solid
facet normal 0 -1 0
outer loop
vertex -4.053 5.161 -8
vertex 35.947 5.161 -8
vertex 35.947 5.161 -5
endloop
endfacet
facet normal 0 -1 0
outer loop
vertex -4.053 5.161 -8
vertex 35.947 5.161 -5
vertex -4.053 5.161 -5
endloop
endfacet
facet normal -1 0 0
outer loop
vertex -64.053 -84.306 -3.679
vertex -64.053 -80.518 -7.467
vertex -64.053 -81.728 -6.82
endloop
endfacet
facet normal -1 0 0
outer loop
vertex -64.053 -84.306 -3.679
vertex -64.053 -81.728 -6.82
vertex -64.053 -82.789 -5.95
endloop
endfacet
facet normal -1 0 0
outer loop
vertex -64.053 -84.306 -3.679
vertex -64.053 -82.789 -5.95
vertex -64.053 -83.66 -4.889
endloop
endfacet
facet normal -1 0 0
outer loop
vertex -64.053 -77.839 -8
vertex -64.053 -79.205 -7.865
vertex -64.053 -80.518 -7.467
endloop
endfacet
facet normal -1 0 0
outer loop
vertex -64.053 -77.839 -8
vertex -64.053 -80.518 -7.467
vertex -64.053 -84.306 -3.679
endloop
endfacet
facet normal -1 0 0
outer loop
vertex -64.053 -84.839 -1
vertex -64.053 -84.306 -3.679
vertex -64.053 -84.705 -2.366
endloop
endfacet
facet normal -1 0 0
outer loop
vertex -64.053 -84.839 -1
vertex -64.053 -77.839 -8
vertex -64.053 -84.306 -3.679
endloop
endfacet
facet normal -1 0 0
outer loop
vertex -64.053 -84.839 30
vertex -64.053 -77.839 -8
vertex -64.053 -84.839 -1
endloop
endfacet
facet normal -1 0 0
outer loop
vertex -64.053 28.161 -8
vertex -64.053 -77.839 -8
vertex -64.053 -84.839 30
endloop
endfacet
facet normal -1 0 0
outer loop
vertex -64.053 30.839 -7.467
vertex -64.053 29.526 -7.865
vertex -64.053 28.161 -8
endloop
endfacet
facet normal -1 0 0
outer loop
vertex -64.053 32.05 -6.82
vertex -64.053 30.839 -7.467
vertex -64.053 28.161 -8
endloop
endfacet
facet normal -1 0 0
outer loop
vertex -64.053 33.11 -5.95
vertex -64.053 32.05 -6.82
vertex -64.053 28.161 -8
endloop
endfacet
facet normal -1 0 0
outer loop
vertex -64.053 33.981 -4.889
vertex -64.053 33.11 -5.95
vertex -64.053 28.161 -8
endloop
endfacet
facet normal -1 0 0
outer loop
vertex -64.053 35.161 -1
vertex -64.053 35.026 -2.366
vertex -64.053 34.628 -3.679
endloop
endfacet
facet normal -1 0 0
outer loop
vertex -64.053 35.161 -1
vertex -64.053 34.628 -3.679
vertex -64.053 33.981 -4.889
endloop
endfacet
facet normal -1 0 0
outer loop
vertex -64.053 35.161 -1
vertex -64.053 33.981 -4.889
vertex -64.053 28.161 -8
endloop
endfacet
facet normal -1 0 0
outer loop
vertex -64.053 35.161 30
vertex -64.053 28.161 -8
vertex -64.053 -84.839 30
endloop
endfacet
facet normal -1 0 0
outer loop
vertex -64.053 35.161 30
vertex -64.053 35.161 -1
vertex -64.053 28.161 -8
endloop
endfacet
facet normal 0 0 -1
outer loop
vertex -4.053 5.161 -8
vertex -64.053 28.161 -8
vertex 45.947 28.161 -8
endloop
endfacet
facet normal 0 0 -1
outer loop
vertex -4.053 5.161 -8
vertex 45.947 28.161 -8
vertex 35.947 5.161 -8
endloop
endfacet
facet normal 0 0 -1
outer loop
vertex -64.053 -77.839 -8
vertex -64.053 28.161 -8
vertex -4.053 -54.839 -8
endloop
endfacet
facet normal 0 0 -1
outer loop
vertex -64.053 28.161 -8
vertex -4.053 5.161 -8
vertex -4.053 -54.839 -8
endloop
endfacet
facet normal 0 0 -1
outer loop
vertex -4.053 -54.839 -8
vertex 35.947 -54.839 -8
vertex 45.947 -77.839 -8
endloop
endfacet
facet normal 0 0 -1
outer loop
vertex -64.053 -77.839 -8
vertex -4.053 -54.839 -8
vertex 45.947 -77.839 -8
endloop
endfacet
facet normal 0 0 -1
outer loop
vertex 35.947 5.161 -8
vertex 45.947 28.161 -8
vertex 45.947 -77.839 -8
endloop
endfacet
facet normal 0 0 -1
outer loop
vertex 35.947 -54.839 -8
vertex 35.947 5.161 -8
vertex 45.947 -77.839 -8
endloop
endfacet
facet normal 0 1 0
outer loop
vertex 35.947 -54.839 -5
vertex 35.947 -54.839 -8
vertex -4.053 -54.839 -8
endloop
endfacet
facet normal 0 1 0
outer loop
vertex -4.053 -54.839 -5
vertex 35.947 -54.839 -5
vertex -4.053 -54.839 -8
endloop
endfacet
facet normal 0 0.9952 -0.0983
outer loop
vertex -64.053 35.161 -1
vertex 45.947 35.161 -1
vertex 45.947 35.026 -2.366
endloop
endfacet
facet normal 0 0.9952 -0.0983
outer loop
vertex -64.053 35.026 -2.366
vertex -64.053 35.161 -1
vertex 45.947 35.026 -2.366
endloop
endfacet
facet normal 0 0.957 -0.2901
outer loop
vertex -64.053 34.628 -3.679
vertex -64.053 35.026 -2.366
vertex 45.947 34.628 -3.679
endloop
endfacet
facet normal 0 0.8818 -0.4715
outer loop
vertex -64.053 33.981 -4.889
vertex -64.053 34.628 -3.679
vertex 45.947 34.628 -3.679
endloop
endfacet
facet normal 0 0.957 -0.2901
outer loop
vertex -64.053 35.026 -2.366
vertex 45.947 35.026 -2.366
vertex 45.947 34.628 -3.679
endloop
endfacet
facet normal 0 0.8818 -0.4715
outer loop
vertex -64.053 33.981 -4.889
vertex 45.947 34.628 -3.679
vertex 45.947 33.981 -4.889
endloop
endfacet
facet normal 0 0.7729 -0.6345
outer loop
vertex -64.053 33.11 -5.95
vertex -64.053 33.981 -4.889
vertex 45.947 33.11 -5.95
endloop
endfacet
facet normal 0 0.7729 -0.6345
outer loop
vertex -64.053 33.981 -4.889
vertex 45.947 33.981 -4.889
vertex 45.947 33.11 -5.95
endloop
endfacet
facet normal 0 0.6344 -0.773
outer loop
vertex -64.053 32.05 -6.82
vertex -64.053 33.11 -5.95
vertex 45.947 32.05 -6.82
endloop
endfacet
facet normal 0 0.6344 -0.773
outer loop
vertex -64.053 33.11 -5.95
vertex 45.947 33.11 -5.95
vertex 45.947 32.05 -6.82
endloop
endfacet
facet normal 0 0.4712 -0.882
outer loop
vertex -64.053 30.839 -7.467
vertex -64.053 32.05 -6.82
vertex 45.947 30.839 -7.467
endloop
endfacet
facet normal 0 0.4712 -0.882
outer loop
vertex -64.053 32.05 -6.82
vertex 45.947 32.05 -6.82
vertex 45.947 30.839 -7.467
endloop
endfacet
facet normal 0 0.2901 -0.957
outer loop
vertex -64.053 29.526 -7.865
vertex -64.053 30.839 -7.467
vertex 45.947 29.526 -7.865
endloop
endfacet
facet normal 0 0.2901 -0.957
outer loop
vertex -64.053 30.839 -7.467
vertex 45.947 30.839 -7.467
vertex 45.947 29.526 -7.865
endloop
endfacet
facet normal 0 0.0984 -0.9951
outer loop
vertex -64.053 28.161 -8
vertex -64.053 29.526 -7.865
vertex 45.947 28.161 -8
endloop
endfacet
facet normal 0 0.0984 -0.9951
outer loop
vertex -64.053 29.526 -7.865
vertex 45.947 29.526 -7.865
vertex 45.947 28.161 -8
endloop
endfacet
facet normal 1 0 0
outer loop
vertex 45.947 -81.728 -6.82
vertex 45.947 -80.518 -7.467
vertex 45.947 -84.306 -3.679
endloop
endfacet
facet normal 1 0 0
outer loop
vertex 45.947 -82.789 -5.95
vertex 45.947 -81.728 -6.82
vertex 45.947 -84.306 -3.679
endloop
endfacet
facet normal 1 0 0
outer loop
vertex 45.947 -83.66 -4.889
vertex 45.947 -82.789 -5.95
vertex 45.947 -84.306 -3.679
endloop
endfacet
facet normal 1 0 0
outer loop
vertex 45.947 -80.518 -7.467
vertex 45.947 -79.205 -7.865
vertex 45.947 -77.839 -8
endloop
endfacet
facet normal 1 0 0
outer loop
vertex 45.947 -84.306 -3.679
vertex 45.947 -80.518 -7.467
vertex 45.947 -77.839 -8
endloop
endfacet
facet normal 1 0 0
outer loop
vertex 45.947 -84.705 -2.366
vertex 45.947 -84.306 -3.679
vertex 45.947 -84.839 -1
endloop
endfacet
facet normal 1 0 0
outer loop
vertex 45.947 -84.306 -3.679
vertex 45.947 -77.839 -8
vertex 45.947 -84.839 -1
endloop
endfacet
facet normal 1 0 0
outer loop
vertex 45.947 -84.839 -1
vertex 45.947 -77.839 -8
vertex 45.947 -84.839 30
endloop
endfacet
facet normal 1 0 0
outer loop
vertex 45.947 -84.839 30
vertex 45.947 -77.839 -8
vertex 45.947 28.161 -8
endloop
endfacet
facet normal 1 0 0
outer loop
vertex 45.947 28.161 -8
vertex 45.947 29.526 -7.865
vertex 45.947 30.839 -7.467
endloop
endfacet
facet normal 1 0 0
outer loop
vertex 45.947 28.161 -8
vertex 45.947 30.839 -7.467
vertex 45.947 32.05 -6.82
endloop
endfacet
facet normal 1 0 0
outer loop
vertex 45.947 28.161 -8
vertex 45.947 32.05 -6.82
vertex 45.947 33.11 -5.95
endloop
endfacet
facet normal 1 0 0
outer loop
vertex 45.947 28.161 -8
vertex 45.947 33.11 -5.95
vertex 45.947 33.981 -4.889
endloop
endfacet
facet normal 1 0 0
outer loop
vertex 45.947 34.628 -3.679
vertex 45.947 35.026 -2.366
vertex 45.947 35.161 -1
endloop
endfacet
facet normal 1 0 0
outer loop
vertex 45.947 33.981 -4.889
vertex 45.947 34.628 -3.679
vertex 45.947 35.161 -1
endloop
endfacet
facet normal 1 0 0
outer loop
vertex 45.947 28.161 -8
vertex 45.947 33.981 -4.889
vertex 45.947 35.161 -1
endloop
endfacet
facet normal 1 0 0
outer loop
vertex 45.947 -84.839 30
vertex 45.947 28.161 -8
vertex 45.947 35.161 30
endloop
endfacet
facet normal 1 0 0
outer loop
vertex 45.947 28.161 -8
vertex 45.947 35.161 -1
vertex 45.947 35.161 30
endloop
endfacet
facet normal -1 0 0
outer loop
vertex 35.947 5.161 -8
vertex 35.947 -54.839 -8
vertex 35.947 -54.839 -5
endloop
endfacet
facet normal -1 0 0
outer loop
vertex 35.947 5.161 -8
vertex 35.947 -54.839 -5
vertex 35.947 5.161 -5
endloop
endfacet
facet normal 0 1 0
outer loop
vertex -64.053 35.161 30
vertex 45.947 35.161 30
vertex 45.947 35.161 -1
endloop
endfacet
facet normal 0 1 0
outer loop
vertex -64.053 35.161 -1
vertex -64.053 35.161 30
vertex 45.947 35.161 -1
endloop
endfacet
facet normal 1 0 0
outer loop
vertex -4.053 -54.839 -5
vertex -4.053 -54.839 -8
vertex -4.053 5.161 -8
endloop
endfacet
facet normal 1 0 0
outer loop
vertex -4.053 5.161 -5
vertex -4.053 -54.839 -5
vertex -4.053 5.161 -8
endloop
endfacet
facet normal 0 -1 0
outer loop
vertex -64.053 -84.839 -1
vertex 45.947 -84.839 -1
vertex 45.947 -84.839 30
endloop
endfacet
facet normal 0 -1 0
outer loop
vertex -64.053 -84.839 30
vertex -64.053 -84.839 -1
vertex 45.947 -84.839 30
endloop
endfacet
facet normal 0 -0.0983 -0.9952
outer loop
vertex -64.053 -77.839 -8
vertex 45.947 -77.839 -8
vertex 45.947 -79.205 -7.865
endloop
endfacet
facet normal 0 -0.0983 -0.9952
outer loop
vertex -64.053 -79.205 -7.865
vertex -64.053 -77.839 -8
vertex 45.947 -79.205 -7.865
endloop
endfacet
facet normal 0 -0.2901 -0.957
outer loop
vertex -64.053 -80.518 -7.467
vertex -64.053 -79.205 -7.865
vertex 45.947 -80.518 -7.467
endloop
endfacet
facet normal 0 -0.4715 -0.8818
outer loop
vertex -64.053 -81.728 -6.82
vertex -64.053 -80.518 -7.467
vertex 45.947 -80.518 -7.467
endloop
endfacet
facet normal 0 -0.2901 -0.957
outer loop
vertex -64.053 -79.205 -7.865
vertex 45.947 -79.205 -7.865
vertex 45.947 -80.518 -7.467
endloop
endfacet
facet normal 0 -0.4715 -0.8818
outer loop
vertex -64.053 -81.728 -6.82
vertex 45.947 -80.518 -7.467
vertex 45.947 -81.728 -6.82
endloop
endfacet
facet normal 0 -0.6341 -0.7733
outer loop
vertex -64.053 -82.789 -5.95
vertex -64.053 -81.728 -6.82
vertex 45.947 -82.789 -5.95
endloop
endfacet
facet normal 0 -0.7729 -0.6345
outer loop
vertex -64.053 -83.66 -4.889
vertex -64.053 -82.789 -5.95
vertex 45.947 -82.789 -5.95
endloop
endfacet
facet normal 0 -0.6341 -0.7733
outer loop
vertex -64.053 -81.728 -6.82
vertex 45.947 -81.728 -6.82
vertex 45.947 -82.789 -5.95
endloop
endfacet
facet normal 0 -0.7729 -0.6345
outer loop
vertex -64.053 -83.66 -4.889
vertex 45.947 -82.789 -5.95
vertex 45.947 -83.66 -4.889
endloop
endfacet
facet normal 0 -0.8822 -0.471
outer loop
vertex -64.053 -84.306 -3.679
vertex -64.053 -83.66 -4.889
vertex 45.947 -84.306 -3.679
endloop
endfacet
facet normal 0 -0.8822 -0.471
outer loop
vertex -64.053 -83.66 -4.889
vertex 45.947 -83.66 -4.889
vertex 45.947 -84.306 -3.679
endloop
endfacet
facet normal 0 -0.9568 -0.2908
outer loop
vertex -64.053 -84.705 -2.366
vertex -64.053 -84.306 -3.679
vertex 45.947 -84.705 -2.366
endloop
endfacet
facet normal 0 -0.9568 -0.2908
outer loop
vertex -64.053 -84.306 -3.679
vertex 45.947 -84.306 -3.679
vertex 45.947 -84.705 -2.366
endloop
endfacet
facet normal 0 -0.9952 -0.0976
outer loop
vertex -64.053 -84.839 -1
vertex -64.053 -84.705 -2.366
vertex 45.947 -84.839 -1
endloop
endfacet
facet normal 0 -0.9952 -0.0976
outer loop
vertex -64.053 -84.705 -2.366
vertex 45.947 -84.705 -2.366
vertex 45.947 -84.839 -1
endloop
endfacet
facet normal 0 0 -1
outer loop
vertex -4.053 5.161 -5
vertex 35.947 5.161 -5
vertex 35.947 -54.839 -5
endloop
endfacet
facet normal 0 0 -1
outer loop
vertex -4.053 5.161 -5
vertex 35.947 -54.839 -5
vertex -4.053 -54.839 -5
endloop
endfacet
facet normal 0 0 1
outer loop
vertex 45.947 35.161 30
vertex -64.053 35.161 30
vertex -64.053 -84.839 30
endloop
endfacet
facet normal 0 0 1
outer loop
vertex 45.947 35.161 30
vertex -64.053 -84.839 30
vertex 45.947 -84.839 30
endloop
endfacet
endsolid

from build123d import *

# Parameters (mm, degrees)
SKETCH_1_W          = 110
SKETCH_1_H          = 120
EXTRUDE_1_DEPTH     = 30
EXTRUDE_2_DEPTH     = 110
SKETCH_3_W          = 40
SKETCH_3_H          = 60
CUT_EXTRUDE_1_DEPTH = 3


with BuildPart() as part:
    # 스케치1 → 보스-돌출1 (new body)
    with BuildSketch(Plane.XY):
        with Locations((-9.053023491, -24.839285714)):
            Rectangle(SKETCH_1_W, SKETCH_1_H)
    extrude(amount=EXTRUDE_1_DEPTH)

    # 스케치2 → 보스-돌출2 (add)
    with BuildSketch(Plane(origin=(45.946976509, 0, 0), x_dir=(0, 0, -1), z_dir=(1, 0, 0))):
        with BuildLine():
            Line((0, 35.160714286), (1, 35.160714286))
            ThreePointArc((1, 35.160714286), (5.949747468, 33.110461754), (8, 28.160714286))
            Line((8, 28.160714286), (8, -77.839285714))
            ThreePointArc((8, -77.839285714), (5.949747468, -82.789033183), (1, -84.839285714))
            Line((1, -84.839285714), (0, -84.839285714))
            Line((0, -84.839285714), (0, 35.160714286))
        make_face()
    extrude(amount=-EXTRUDE_2_DEPTH)

    # 스케치3 → 컷-돌출1 (cut)
    with BuildSketch(Plane(origin=(0, 0, -8), x_dir=(-1, 0, 0), z_dir=(0, 0, -1))):
        with Locations((-15.946976509, -24.839285714)):
            Rectangle(SKETCH_3_W, SKETCH_3_H)
    extrude(amount=-CUT_EXTRUDE_1_DEPTH, mode=Mode.SUBTRACT)


solid = part.part
